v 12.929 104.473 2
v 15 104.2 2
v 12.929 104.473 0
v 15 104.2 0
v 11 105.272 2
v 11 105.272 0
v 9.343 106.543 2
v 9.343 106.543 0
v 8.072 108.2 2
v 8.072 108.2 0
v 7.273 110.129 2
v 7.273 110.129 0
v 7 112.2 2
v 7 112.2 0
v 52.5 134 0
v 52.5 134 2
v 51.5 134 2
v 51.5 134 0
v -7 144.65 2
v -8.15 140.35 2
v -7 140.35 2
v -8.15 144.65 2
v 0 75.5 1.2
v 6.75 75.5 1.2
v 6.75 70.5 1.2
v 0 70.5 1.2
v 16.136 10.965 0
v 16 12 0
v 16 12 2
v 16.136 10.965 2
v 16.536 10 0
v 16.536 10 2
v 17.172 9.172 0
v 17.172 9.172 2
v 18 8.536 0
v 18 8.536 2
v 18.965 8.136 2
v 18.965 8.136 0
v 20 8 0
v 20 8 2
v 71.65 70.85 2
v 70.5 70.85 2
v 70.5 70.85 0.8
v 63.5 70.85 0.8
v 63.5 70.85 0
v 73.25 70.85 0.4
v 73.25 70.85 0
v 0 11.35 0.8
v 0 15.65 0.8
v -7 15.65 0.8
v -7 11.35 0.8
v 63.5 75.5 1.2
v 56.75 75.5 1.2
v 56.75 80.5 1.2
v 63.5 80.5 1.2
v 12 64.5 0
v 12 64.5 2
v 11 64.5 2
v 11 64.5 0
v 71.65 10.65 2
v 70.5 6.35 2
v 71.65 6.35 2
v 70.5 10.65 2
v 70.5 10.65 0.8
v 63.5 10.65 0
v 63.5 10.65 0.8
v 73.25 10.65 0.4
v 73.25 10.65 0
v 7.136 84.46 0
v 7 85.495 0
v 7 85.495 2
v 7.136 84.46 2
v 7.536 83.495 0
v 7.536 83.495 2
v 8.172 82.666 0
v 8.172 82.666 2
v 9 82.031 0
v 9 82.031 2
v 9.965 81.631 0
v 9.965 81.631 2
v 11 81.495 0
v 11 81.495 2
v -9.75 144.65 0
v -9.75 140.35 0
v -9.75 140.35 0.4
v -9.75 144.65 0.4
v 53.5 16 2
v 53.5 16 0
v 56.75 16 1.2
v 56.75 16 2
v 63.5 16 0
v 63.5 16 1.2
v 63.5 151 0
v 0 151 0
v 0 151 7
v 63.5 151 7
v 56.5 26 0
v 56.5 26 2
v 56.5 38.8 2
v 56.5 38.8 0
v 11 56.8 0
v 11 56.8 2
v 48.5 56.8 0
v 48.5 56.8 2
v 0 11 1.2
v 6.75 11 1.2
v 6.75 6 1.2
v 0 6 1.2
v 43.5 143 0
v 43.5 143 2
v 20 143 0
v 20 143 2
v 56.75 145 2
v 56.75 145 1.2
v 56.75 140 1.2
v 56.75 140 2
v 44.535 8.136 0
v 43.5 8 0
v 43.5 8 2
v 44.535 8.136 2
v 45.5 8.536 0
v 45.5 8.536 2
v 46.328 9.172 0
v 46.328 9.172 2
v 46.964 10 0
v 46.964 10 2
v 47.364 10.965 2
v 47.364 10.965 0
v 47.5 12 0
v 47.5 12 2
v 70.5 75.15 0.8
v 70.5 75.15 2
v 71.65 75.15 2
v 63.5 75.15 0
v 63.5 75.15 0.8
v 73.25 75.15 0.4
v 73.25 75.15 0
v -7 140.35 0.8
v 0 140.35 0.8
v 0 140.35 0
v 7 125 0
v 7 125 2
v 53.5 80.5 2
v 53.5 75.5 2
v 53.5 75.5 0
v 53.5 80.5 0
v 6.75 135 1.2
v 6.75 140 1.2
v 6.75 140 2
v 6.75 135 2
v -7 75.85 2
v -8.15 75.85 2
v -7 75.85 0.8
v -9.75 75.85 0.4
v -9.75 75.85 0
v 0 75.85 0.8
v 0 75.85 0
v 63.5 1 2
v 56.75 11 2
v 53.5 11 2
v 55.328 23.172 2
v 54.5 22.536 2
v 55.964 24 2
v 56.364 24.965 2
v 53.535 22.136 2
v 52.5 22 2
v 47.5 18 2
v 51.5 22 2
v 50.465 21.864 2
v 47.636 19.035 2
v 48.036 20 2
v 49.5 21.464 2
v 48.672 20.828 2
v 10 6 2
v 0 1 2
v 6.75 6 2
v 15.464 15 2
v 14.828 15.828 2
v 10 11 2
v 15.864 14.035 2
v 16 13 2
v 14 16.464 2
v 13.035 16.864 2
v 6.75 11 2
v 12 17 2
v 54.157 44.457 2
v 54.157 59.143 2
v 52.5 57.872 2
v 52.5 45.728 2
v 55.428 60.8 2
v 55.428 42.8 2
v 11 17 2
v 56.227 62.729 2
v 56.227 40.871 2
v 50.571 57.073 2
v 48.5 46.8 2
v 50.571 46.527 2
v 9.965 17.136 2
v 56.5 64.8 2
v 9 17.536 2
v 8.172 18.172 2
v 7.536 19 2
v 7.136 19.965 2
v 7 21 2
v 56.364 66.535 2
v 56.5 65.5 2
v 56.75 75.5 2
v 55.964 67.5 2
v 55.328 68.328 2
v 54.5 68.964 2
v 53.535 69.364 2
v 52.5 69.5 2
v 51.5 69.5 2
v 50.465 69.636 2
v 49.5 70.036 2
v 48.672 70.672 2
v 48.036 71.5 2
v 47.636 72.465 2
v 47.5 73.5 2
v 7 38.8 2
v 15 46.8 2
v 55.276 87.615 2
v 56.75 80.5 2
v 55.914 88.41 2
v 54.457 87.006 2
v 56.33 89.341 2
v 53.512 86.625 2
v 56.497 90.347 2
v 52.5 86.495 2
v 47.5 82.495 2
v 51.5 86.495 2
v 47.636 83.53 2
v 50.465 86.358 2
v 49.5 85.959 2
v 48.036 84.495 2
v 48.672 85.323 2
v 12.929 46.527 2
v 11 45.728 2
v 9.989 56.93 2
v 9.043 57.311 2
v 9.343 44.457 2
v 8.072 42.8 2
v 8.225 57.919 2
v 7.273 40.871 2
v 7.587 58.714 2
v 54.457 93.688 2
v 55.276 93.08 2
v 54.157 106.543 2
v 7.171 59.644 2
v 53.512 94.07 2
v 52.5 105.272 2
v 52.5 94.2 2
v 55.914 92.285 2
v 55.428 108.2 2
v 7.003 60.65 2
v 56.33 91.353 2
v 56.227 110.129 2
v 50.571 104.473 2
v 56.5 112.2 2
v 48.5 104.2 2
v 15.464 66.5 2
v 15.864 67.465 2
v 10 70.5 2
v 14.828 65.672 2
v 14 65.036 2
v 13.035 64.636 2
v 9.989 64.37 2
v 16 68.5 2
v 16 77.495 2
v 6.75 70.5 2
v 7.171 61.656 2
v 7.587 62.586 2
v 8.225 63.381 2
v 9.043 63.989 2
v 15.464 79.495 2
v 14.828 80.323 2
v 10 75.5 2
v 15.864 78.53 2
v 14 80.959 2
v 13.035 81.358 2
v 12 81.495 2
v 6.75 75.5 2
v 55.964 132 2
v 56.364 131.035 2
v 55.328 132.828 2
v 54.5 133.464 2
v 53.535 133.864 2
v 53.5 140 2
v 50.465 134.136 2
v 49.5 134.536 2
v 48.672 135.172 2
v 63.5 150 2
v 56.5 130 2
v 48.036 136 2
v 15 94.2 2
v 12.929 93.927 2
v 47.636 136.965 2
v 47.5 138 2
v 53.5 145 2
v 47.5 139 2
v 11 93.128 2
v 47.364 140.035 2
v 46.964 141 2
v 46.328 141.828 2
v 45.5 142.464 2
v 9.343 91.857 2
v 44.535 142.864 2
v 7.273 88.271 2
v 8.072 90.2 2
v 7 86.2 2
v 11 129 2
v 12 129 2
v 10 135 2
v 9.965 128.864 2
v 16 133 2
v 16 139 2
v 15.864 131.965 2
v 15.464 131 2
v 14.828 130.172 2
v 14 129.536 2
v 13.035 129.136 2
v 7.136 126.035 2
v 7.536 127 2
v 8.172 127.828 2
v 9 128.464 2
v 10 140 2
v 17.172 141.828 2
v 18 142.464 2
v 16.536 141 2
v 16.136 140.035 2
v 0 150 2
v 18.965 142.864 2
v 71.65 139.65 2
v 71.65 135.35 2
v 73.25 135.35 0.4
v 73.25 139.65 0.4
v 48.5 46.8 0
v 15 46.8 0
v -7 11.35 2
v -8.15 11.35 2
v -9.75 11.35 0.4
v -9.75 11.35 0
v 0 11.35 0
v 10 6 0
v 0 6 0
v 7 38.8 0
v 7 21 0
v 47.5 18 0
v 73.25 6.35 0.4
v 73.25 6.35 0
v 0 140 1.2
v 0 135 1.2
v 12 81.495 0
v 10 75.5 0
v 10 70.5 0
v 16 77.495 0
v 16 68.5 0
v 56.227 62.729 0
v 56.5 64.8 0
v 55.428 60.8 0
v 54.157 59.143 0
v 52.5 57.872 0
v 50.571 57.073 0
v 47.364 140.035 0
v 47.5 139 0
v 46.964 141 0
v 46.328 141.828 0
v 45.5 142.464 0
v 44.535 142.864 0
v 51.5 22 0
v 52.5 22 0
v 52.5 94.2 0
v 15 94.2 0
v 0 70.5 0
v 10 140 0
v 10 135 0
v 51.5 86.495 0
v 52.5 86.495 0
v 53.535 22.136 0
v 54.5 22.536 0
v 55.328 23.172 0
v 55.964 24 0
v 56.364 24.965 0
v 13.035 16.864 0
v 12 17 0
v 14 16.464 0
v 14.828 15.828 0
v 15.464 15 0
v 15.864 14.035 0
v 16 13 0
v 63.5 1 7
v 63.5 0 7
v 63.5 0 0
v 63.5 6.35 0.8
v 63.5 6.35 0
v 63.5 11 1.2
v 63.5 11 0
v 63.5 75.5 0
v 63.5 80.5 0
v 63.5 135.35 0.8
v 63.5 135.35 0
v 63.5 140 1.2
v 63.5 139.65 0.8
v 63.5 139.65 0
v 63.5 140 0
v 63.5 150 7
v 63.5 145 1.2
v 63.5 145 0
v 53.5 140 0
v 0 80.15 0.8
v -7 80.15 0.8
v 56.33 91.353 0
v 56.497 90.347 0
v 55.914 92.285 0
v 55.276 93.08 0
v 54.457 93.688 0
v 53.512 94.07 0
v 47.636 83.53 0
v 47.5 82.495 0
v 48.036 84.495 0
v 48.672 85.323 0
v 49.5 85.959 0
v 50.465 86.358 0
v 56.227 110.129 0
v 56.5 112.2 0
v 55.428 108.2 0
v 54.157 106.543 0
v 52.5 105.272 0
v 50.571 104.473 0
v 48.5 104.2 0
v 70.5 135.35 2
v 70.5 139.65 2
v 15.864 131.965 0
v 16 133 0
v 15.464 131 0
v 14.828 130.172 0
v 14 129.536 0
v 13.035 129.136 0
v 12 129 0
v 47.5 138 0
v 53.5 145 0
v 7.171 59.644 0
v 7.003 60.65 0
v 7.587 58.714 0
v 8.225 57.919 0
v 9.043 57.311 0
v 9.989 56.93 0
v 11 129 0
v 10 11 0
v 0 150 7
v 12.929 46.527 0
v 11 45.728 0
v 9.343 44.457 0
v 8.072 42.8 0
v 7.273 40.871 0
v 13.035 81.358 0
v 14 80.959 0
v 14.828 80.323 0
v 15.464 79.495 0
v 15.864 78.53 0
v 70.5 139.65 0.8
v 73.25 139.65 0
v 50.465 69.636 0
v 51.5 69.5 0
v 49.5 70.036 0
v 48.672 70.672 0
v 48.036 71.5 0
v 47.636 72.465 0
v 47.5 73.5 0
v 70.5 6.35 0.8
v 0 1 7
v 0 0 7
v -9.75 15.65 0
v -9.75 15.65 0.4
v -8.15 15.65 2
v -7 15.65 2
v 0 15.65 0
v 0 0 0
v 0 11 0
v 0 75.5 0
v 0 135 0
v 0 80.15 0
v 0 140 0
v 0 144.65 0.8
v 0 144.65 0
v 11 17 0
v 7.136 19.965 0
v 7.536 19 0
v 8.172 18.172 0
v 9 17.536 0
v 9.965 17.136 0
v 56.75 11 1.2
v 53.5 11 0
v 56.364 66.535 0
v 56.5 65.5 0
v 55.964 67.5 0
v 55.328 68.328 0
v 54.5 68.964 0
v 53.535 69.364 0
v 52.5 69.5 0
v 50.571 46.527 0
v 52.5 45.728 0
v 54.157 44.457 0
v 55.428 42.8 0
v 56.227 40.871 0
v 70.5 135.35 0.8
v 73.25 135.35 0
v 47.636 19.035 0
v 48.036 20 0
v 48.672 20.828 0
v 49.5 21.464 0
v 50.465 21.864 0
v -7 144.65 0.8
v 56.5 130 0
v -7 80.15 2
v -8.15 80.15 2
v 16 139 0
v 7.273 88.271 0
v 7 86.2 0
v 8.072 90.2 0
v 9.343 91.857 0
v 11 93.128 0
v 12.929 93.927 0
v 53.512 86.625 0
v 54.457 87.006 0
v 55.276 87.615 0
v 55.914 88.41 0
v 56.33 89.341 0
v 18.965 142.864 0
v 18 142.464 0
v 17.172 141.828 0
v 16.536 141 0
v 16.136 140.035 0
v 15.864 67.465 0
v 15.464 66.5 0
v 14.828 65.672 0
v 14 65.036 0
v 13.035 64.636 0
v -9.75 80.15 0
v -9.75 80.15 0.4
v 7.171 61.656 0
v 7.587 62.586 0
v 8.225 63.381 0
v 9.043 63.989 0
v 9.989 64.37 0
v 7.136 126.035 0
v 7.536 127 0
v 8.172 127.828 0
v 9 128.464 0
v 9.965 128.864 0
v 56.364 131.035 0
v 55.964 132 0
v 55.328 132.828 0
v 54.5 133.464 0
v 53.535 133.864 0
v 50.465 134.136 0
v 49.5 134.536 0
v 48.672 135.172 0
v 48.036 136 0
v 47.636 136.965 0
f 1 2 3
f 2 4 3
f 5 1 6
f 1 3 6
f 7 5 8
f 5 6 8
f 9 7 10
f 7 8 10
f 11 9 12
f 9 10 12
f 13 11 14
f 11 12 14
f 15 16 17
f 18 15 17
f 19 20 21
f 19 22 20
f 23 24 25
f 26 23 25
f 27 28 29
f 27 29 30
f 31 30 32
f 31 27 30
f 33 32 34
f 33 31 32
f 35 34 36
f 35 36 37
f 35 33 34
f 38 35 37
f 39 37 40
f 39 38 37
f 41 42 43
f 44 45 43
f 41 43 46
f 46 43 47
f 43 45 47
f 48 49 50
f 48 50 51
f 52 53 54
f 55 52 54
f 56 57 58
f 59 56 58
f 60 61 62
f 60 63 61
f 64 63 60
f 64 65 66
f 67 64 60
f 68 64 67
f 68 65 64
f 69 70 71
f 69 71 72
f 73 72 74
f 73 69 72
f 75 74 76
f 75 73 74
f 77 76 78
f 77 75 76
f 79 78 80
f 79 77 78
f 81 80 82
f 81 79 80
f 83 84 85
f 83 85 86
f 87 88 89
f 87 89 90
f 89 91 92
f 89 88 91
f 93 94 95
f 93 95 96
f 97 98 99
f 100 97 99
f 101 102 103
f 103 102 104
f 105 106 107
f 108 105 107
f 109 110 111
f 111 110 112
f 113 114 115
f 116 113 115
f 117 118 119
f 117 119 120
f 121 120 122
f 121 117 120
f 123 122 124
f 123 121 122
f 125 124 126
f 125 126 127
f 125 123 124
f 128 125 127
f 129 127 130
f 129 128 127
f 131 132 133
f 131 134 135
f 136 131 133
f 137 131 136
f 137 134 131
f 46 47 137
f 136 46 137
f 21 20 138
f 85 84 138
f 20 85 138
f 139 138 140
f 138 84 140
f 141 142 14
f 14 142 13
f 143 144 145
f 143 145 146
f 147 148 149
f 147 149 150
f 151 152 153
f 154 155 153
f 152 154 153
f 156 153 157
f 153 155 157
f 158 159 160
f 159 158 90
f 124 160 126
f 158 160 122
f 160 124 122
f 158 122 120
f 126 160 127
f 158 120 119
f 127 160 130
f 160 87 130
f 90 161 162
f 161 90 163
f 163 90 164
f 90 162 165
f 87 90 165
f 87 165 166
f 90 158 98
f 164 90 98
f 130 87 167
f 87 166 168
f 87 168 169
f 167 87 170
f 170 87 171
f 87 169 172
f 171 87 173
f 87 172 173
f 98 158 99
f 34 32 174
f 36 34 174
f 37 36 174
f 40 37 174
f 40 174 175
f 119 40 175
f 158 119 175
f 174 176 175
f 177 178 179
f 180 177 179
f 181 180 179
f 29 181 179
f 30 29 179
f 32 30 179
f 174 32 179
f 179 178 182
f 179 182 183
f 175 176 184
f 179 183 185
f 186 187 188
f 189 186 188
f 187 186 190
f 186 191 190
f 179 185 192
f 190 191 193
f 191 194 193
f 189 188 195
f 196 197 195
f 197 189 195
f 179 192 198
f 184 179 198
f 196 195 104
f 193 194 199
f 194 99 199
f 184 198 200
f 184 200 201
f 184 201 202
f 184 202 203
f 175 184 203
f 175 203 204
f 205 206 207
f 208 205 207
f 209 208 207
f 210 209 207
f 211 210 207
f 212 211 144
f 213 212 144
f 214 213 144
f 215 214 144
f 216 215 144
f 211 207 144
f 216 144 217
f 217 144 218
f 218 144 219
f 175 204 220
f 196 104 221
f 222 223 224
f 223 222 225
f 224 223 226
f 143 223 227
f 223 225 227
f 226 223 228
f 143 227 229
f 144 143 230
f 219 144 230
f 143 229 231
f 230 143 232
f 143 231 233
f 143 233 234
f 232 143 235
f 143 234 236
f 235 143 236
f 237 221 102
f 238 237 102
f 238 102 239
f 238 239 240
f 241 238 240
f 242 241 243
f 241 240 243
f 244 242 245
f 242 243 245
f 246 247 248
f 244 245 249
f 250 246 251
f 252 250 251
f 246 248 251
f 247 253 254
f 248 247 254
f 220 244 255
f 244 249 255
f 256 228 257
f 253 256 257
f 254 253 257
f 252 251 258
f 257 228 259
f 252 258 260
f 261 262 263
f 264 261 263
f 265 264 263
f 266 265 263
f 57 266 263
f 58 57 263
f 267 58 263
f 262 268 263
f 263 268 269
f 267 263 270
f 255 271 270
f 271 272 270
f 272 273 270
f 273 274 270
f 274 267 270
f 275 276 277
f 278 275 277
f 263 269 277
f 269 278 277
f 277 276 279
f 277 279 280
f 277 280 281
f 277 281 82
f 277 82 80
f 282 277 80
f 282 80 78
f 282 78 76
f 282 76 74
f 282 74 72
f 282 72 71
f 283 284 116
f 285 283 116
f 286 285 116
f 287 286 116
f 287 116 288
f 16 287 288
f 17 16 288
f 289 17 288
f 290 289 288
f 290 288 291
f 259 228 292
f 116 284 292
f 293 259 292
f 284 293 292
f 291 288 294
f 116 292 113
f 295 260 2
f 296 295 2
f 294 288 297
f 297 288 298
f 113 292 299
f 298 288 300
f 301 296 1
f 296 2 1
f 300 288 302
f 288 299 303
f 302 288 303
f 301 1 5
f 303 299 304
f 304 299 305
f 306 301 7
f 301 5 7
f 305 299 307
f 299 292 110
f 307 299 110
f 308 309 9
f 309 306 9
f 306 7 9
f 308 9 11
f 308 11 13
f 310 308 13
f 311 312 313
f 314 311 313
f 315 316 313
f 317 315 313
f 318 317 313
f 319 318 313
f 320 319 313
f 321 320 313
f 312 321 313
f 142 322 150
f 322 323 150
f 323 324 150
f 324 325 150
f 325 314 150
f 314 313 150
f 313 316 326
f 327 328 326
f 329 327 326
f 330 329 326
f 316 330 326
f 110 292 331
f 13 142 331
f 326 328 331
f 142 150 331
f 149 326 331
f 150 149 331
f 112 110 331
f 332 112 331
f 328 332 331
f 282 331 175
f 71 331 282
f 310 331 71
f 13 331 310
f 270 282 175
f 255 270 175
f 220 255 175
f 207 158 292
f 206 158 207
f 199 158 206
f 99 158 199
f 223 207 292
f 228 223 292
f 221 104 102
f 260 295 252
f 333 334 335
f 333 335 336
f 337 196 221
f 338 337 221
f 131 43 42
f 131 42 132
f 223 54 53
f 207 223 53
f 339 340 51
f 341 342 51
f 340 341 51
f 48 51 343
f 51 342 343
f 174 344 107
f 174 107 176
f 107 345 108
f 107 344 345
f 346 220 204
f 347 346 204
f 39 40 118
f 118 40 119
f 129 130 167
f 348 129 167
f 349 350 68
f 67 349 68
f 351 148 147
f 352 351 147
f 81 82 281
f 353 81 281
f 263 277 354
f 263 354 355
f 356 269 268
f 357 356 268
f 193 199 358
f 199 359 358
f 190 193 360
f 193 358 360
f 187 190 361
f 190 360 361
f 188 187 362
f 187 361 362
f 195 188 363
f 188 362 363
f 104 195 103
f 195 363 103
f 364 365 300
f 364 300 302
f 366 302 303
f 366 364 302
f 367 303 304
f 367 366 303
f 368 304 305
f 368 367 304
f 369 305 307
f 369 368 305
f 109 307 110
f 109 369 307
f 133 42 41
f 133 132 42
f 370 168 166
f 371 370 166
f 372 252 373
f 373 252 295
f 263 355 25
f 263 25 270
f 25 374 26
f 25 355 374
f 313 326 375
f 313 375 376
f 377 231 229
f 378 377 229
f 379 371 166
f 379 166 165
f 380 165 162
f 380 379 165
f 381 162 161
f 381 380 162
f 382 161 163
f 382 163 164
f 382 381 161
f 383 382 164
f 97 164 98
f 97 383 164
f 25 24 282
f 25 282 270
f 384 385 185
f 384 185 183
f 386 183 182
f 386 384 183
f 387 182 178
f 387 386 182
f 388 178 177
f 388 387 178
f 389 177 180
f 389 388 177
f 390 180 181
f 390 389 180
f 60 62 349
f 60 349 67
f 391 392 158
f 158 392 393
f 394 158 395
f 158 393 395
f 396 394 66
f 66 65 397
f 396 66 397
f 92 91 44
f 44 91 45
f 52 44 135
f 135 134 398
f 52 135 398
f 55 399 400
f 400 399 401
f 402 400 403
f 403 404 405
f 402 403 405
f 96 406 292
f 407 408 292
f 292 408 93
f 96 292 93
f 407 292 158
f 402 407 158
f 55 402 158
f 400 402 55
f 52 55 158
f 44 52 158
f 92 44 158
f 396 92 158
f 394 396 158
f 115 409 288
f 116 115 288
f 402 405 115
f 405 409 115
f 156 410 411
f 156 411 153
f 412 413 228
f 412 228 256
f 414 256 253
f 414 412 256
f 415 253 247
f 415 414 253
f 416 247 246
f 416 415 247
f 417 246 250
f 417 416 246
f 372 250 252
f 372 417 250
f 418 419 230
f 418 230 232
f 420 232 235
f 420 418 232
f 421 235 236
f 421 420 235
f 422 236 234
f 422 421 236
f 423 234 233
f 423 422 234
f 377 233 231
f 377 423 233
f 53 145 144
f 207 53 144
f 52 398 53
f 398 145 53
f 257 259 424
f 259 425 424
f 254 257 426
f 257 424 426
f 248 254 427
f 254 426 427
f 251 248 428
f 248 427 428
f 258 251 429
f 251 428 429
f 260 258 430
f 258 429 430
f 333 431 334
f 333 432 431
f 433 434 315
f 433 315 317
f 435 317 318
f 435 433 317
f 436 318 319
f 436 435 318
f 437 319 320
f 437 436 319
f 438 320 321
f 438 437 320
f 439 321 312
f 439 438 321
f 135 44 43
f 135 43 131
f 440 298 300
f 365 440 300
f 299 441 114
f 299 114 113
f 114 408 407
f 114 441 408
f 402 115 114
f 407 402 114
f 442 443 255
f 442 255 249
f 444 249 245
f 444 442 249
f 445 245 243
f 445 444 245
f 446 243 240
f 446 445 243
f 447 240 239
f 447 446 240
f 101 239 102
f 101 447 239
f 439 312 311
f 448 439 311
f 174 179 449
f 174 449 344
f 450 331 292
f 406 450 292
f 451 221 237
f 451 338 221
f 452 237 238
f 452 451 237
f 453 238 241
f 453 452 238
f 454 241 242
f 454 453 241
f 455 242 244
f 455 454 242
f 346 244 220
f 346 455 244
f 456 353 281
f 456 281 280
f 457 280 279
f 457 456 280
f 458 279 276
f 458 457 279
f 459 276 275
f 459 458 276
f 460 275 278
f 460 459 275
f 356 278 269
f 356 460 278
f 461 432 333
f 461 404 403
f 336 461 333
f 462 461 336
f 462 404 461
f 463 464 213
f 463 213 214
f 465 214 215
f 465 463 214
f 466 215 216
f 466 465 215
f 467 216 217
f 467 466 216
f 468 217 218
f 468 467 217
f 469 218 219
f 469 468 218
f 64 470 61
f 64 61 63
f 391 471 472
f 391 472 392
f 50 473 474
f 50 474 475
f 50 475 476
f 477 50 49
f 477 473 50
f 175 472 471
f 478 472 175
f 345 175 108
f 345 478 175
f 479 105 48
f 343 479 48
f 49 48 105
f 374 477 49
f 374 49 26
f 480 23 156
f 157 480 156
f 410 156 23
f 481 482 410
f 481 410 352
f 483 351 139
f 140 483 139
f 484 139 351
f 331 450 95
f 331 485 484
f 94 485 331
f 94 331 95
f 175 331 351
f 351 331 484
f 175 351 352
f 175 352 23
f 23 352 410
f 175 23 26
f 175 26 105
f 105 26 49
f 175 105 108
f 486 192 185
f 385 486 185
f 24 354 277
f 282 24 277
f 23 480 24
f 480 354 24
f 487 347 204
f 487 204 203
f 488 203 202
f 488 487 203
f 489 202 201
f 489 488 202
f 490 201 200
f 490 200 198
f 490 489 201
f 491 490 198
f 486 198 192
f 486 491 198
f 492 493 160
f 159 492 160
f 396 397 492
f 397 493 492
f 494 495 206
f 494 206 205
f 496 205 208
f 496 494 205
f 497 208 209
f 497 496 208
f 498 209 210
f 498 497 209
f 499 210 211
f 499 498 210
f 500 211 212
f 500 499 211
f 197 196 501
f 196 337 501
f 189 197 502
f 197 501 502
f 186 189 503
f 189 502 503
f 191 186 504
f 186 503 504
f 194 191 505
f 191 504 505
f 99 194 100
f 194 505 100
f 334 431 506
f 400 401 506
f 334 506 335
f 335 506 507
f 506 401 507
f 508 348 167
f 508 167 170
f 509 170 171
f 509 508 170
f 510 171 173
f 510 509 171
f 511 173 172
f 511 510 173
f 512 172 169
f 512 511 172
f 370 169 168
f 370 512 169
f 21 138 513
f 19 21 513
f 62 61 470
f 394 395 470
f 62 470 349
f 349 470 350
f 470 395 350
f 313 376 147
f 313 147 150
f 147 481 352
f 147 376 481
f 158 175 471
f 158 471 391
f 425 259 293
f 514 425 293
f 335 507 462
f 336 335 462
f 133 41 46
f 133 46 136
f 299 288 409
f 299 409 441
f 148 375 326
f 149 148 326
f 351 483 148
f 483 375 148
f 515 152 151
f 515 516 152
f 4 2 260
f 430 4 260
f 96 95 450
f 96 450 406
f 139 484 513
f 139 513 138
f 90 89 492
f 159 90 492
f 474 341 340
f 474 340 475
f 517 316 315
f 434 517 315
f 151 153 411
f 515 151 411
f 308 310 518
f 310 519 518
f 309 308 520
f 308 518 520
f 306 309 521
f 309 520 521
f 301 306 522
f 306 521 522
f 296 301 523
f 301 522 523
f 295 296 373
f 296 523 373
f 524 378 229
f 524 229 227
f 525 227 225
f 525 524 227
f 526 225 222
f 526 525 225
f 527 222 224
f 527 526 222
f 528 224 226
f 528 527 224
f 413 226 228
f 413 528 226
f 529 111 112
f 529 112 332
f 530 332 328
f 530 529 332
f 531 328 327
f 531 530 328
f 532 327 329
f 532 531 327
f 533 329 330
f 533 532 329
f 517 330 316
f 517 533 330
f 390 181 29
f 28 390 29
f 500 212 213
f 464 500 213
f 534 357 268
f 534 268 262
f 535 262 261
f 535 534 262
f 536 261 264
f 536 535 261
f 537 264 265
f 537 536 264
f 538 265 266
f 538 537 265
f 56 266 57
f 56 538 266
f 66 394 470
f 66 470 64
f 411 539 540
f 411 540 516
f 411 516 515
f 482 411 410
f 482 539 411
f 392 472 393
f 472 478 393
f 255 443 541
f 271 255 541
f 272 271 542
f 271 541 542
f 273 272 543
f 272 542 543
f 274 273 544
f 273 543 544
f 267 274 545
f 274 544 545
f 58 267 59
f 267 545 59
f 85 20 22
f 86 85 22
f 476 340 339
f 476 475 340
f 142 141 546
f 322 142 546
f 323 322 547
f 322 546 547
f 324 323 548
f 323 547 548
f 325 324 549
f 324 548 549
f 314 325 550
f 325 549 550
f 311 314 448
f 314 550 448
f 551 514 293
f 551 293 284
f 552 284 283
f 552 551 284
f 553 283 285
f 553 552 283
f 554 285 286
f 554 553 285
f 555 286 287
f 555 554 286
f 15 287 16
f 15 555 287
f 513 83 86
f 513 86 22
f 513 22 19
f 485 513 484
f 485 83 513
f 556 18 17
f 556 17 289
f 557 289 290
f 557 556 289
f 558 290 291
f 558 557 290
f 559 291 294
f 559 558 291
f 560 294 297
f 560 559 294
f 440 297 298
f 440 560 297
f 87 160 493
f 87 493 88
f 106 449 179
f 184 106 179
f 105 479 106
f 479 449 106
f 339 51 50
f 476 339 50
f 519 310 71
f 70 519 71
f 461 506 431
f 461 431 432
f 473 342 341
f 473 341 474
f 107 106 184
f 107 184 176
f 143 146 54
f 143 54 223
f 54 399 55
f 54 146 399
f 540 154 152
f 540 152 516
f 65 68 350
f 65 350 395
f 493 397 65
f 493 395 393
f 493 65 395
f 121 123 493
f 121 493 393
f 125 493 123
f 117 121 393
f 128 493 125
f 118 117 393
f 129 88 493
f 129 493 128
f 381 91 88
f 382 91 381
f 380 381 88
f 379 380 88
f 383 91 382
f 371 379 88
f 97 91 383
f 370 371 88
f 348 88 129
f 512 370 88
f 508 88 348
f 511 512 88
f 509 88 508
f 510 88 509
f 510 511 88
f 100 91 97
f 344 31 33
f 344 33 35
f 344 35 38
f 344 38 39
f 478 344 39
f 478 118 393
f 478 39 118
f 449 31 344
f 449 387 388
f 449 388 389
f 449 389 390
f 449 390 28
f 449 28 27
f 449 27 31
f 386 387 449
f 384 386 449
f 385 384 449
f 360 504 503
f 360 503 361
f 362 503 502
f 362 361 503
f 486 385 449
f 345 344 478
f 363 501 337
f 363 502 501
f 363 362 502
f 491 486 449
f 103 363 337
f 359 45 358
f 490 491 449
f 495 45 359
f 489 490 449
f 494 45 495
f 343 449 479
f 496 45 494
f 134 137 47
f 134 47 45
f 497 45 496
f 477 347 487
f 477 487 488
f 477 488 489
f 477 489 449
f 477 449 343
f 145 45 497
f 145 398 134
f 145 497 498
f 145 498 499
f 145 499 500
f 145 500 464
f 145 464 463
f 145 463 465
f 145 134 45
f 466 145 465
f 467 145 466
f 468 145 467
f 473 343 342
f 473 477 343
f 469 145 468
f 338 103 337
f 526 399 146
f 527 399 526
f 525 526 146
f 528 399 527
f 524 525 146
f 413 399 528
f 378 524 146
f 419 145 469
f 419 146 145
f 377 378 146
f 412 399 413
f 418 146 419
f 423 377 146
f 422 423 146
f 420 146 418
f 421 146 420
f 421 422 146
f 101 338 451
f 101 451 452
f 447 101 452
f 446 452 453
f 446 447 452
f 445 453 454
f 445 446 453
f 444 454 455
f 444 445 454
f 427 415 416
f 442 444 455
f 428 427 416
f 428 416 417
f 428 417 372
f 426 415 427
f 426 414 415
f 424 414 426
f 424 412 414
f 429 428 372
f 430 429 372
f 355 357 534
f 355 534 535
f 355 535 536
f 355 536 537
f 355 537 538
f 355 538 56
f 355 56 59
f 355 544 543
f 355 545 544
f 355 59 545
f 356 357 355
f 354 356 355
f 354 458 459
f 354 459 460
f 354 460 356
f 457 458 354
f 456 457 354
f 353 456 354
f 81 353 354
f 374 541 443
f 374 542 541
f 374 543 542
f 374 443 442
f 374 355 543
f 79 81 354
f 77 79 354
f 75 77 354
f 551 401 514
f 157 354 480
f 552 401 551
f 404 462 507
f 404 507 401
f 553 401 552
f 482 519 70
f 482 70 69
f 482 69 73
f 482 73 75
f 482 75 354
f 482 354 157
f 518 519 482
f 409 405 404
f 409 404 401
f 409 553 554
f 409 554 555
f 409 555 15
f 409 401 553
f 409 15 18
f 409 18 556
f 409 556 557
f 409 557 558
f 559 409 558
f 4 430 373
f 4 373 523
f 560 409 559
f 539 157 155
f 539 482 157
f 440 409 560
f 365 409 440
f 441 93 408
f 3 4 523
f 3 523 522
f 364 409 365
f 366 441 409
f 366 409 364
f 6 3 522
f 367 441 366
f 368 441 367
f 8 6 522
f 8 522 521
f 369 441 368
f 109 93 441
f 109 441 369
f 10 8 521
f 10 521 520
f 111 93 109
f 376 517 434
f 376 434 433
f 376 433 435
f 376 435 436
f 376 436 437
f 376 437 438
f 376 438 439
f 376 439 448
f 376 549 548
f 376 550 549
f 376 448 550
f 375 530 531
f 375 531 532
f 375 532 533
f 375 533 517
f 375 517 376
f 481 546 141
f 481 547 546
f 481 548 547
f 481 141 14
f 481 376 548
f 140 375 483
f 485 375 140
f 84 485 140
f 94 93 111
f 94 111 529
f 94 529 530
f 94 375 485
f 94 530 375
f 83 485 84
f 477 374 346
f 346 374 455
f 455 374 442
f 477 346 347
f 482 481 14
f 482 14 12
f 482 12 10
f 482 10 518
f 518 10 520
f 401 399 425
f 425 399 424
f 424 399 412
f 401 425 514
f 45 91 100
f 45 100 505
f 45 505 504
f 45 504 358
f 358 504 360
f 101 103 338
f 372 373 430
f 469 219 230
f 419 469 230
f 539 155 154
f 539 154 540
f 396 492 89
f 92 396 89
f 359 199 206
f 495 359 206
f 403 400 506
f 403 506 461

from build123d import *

# Parameters (mm, degrees)
F0_W         = 63.5
F0_H         = 151
F1_DEPTH     = 2
F2_W         = 63.5
F2_H         = 1
F3_DEPTH     = 5
F4_W         = 5
F4_H         = 1.2
F5_DEPTH     = 10
F6_W         = 5
F6_H         = 1.2
F7_DEPTH     = 10
F8_W         = 4.3
F8_H         = 0.8
F9_DEPTH     = 9.75
F10_W        = 4.3
F10_H        = 0.8
F11_DEPTH    = 9.75
F12_W        = 2.75
F12_H        = 4.3
F13_DEPTH    = 1.2
F14_W        = 2.75
F14_H        = 4.3
F15_DEPTH    = 1.2
F16_W        = 2.75
F16_H        = 4.3
F17_DEPTH    = 1.2
F18_W        = 2.75
F18_H        = 4.3
F19_DEPTH    = 1.2
F20_W        = 2.75
F20_H        = 4.3
F21_DEPTH    = 1.2
F22_W        = 2.75
F22_H        = 4.3
F23_DEPTH    = 1.2
F28_W        = 3.25
F28_H        = 5
F29_W        = 3.25
F29_H        = 5
F27_W        = 3.25
F27_H        = 5
F26_W        = 3.25
F26_H        = 5
F25_W        = 3.25
F25_H        = 5
F24_W        = 3.25
F24_H        = 5
F30_DEPTH    = 5.801
F31_SIZE     = 1.6
F33_DEPTH    = 2.001
F34_T1_DEPTH = 2
F34_T3_DEPTH = 22
F35_R        = 8


# Not quite as in the source:
# - a fillet or chamfer that OpenCascade refuses, or shapes differently, is made with other operations: its cross-section is extruded or revolved along the edge and cut away or added


with BuildPart() as f1:
    # F0 (on Top) → F1 (new body)
    with BuildSketch(Plane.XY):
        with Locations((31.75, 75.5)):
            Rectangle(F0_W, F0_H)
    extrude(amount=F1_DEPTH)

    # F2 (on face) → F3 (join)
    with BuildSketch(Plane.XY.offset(2)):
        with Locations((31.75, 0.5)):
            Rectangle(F2_W, F2_H)
        with Locations((31.75, 150.5)):
            Rectangle(F2_W, F2_H)
    extrude(amount=F3_DEPTH)

    # F4 (on face) → F5 (cut)
    with BuildSketch(Plane.YZ.offset(63.5)):
        with Locations((13.5, 0.6)):
            Rectangle(F4_W, F4_H)
        with Locations((78, 0.6)):
            Rectangle(F4_W, F4_H)
        with Locations((142.5, 0.6)):
            Rectangle(F4_W, F4_H)
    extrude(amount=-F5_DEPTH, mode=Mode.SUBTRACT)

    # F6 (on face) → F7 (cut)
    with BuildSketch(Plane(origin=(0, 0, 0), x_dir=(0, -1, 0), z_dir=(-1, 0, 0))):
        with Locations((-137.5, 0.6)):
            Rectangle(F6_W, F6_H)
        with Locations((-73, 0.6)):
            Rectangle(F6_W, F6_H)
        with Locations((-8.5, 0.6)):
            Rectangle(F6_W, F6_H)
    extrude(amount=-F7_DEPTH, mode=Mode.SUBTRACT)

    # F8 (on face) → F9 (join)
    with BuildSketch(Plane.YZ.offset(63.5)):
        with Locations((137.5, 0.4)):
            Rectangle(F8_W, F8_H)
        with Locations((73, 0.4)):
            Rectangle(F8_W, F8_H)
        with Locations((8.5, 0.4)):
            Rectangle(F8_W, F8_H)
    extrude(amount=F9_DEPTH)

    # F10 (on face) → F11 (join)
    with BuildSketch(Plane(origin=(0, 0, 0), x_dir=(0, -1, 0), z_dir=(-1, 0, 0))):
        with Locations((-13.5, 0.4)):
            Rectangle(F10_W, F10_H)
        with Locations((-78, 0.4)):
            Rectangle(F10_W, F10_H)
        with Locations((-142.5, 0.4)):
            Rectangle(F10_W, F10_H)
    extrude(amount=F11_DEPTH)

    # F12 (on face) → F13 (join)
    with BuildSketch(Plane.XY.offset(0.8)):
        with Locations((71.875, 8.5)):
            Rectangle(F12_W, F12_H)
    extrude(amount=F13_DEPTH)

    # F14 (on face) → F15 (join)
    with BuildSketch(Plane.XY.offset(0.8)):
        with Locations((-8.375, 13.5)):
            Rectangle(F14_W, F14_H)
    extrude(amount=F15_DEPTH)

    # F16 (on face) → F17 (join)
    with BuildSketch(Plane.XY.offset(0.8)):
        with Locations((71.875, 73)):
            Rectangle(F16_W, F16_H)
    extrude(amount=F17_DEPTH)

    # F18 (on face) → F19 (join)
    with BuildSketch(Plane.XY.offset(0.8)):
        with Locations((-8.375, 78)):
            Rectangle(F18_W, F18_H)
    extrude(amount=F19_DEPTH)

    # F20 (on face) → F21 (join)
    with BuildSketch(Plane.XY.offset(0.8)):
        with Locations((71.875, 137.5)):
            Rectangle(F20_W, F20_H)
    extrude(amount=F21_DEPTH)

    # F22 (on face) → F23 (join)
    with BuildSketch(Plane.XY.offset(0.8)):
        with Locations((-8.375, 142.5)):
            Rectangle(F22_W, F22_H)
    extrude(amount=F23_DEPTH)

    # F28 (on face) + F29 (on face) + F27 (on face) + F26 (on face) + F25 (on face) + F24 (on face) → F30 (cut, through all)
    with BuildSketch(Plane(origin=(0, 0, 1.2), x_dir=(1, 0, 0), z_dir=(0, 0, -1))):
        with Locations((55.125, -13.5)):
            Rectangle(F28_W, F28_H)
    with BuildSketch(Plane(origin=(0, 0, 1.2), x_dir=(1, 0, 0), z_dir=(0, 0, -1))):
        with Locations((8.375, -8.5)):
            Rectangle(F29_W, F29_H)
    with BuildSketch(Plane(origin=(0, 0, 1.2), x_dir=(1, 0, 0), z_dir=(0, 0, -1))):
        with Locations((8.375, -73)):
            Rectangle(F27_W, F27_H)
    with BuildSketch(Plane(origin=(0, 0, 1.2), x_dir=(1, 0, 0), z_dir=(0, 0, -1))):
        with Locations((55.125, -78)):
            Rectangle(F26_W, F26_H)
    with BuildSketch(Plane(origin=(0, 0, 1.2), x_dir=(1, 0, 0), z_dir=(0, 0, -1))):
        with Locations((8.375, -137.5)):
            Rectangle(F25_W, F25_H)
    with BuildSketch(Plane(origin=(0, 0, 1.2), x_dir=(1, 0, 0), z_dir=(0, 0, -1))):
        with Locations((55.125, -142.5)):
            Rectangle(F24_W, F24_H)
    extrude(amount=-F30_DEPTH, mode=Mode.SUBTRACT)

    # F31
    f31_edges = [f1.edges().sort_by_distance(p)[0] for p in [
        (73.25, 8.5, 2),
        (73.25, 73, 2),
        (73.25, 137.5, 2),
        (-9.75, 142.5, 2),
        (-9.75, 78, 2),
        (-9.75, 13.5, 2),
    ]]
    chamfer(f31_edges, length=F31_SIZE)

    # F32 (on face) → F33 (cut, through all)
    with BuildSketch(Plane.XY.offset(2)):
        Polygon((7, 129), (7, 104.2), (56.5, 104.2), (56.5, 134), (47.5, 134), (47.5, 143), (16, 143), (16, 129), align=None)
        Polygon((7, 64.5), (7, 56.8), (56.5, 56.8), (56.5, 69.5), (47.5, 69.5), (47.5, 86.4947894041), (56.5, 86.4947894041), (56.5, 94.2), (7, 94.2), (7, 81.4947894041), (16, 81.4947894041), (16, 64.5), align=None)
        Polygon((7, 46.8), (7, 17), (16, 17), (16, 8), (47.5, 8), (47.5, 22), (56.5, 22), (56.5, 46.8), align=None)
    extrude(amount=-F33_DEPTH, mode=Mode.SUBTRACT)

    # F34: fillet of radius 4 on 22 edges, made by hand

    # F34_s2 → F34_t1 (join)
    with BuildSketch(Plane.XY):
        with BuildLine():
            ThreePointArc((20, 143), (17.1715728753, 141.8284271247), (16, 139))
            Line((16, 139), (16, 143))
            Line((16, 143), (20, 143))
        make_face()
        with BuildLine():
            ThreePointArc((7, 125), (8.1715728753, 127.8284271247), (11, 129))
            Line((11, 129), (7, 129))
            Line((7, 129), (7, 125))
        make_face()
        with BuildLine():
            ThreePointArc((7, 60.5), (8.1715728753, 63.3284271247), (11, 64.5))
            Line((11, 64.5), (7, 64.5))
            Line((7, 64.5), (7, 60.5))
        make_face()
        with BuildLine():
            ThreePointArc((52.5, 86.4947894041), (55.3284271247, 87.6663622794), (56.5, 90.4947894041))
            Line((56.5, 90.4947894041), (56.5, 86.4947894041))
            Line((56.5, 86.4947894041), (52.5, 86.4947894041))
        make_face()
        with BuildLine():
            ThreePointArc((52.5, 22), (55.3284271247, 23.1715728753), (56.5, 26))
            Line((56.5, 26), (56.5, 22))
            Line((56.5, 22), (52.5, 22))
        make_face()
        with BuildLine():
            ThreePointArc((43.5, 8), (46.3284271247, 9.1715728753), (47.5, 12))
            Line((47.5, 12), (47.5, 8))
            Line((47.5, 8), (43.5, 8))
        make_face()
        with BuildLine():
            ThreePointArc((56.5, 65.5), (55.3284271247, 68.3284271247), (52.5, 69.5))
            Line((52.5, 69.5), (56.5, 69.5))
            Line((56.5, 69.5), (56.5, 65.5))
        make_face()
        with BuildLine():
            ThreePointArc((56.5, 130), (55.3284271247, 132.8284271247), (52.5, 134))
            Line((52.5, 134), (56.5, 134))
            Line((56.5, 134), (56.5, 130))
        make_face()
        with BuildLine():
            ThreePointArc((47.5, 139), (46.3284271247, 141.8284271247), (43.5, 143))
            Line((43.5, 143), (47.5, 143))
            Line((47.5, 143), (47.5, 139))
        make_face()
        with BuildLine():
            ThreePointArc((7, 85.4947894041), (8.1715728753, 82.6663622794), (11, 81.4947894041))
            Line((11, 81.4947894041), (7, 81.4947894041))
            Line((7, 81.4947894041), (7, 85.4947894041))
        make_face()
        with BuildLine():
            ThreePointArc((7, 21), (8.1715728753, 18.1715728753), (11, 17))
            Line((11, 17), (7, 17))
            Line((7, 17), (7, 21))
        make_face()
        with BuildLine():
            ThreePointArc((7, 60.8), (8.1715728753, 57.9715728753), (11, 56.8))
            Line((11, 56.8), (7, 56.8))
            Line((7, 56.8), (7, 60.8))
        make_face()
        with BuildLine():
            ThreePointArc((56.5, 90.2), (55.3284271247, 93.0284271247), (52.5, 94.2))
            Line((52.5, 94.2), (56.5, 94.2))
            Line((56.5, 94.2), (56.5, 90.2))
        make_face()
        with BuildLine():
            ThreePointArc((16, 12), (17.1715728753, 9.1715728753), (20, 8))
            Line((20, 8), (16, 8))
            Line((16, 8), (16, 12))
        make_face()
    extrude(amount=F34_T1_DEPTH)

    # F34_s4 → F34_t3 (cut)
    with BuildSketch(Plane.XY.offset(-10)):
        with BuildLine():
            ThreePointArc((16, 133), (14.8284271247, 130.1715728753), (12, 129))
            Line((12, 129), (16, 129))
            Line((16, 129), (16, 133))
        make_face()
        with BuildLine():
            ThreePointArc((51.5, 134), (48.6715728753, 135.1715728753), (47.5, 138))
            Line((47.5, 138), (47.5, 134))
            Line((47.5, 134), (51.5, 134))
        make_face()
        with BuildLine():
            ThreePointArc((51.5, 69.5), (48.6715728753, 70.6715728753), (47.5, 73.5))
            Line((47.5, 73.5), (47.5, 69.5))
            Line((47.5, 69.5), (51.5, 69.5))
        make_face()
        with BuildLine():
            ThreePointArc((12, 81.4947894041), (14.8284271247, 80.3232165289), (16, 77.4947894041))
            Line((16, 77.4947894041), (16, 81.4947894041))
            Line((16, 81.4947894041), (12, 81.4947894041))
        make_face()
        with BuildLine():
            ThreePointArc((16, 68.5), (14.8284271247, 65.6715728753), (12, 64.5))
            Line((12, 64.5), (16, 64.5))
            Line((16, 64.5), (16, 68.5))
        make_face()
        with BuildLine():
            ThreePointArc((12, 17), (14.8284271247, 15.8284271247), (16, 13))
            Line((16, 13), (16, 17))
            Line((16, 17), (12, 17))
        make_face()
        with BuildLine():
            ThreePointArc((47.5, 82.4947894041), (48.6715728753, 85.3232165289), (51.5, 86.4947894041))
            Line((51.5, 86.4947894041), (47.5, 86.4947894041))
            Line((47.5, 86.4947894041), (47.5, 82.4947894041))
        make_face()
        with BuildLine():
            ThreePointArc((47.5, 18), (48.6715728753, 20.8284271247), (51.5, 22))
            Line((51.5, 22), (47.5, 22))
            Line((47.5, 22), (47.5, 18))
        make_face()
    extrude(amount=F34_T3_DEPTH, mode=Mode.SUBTRACT)

    # F35
    f35_edges = [f1.edges().sort_by_distance(p)[0] for p in [
        (7, 94.2, 1),
        (7, 46.8, 1),
        (56.5, 104.2, 1),
        (56.5, 56.8, 1),
        (7, 104.2, 1),
        (56.5, 46.8, 1),
    ]]
    fillet(f35_edges, radius=F35_R)


solid = f1.part
